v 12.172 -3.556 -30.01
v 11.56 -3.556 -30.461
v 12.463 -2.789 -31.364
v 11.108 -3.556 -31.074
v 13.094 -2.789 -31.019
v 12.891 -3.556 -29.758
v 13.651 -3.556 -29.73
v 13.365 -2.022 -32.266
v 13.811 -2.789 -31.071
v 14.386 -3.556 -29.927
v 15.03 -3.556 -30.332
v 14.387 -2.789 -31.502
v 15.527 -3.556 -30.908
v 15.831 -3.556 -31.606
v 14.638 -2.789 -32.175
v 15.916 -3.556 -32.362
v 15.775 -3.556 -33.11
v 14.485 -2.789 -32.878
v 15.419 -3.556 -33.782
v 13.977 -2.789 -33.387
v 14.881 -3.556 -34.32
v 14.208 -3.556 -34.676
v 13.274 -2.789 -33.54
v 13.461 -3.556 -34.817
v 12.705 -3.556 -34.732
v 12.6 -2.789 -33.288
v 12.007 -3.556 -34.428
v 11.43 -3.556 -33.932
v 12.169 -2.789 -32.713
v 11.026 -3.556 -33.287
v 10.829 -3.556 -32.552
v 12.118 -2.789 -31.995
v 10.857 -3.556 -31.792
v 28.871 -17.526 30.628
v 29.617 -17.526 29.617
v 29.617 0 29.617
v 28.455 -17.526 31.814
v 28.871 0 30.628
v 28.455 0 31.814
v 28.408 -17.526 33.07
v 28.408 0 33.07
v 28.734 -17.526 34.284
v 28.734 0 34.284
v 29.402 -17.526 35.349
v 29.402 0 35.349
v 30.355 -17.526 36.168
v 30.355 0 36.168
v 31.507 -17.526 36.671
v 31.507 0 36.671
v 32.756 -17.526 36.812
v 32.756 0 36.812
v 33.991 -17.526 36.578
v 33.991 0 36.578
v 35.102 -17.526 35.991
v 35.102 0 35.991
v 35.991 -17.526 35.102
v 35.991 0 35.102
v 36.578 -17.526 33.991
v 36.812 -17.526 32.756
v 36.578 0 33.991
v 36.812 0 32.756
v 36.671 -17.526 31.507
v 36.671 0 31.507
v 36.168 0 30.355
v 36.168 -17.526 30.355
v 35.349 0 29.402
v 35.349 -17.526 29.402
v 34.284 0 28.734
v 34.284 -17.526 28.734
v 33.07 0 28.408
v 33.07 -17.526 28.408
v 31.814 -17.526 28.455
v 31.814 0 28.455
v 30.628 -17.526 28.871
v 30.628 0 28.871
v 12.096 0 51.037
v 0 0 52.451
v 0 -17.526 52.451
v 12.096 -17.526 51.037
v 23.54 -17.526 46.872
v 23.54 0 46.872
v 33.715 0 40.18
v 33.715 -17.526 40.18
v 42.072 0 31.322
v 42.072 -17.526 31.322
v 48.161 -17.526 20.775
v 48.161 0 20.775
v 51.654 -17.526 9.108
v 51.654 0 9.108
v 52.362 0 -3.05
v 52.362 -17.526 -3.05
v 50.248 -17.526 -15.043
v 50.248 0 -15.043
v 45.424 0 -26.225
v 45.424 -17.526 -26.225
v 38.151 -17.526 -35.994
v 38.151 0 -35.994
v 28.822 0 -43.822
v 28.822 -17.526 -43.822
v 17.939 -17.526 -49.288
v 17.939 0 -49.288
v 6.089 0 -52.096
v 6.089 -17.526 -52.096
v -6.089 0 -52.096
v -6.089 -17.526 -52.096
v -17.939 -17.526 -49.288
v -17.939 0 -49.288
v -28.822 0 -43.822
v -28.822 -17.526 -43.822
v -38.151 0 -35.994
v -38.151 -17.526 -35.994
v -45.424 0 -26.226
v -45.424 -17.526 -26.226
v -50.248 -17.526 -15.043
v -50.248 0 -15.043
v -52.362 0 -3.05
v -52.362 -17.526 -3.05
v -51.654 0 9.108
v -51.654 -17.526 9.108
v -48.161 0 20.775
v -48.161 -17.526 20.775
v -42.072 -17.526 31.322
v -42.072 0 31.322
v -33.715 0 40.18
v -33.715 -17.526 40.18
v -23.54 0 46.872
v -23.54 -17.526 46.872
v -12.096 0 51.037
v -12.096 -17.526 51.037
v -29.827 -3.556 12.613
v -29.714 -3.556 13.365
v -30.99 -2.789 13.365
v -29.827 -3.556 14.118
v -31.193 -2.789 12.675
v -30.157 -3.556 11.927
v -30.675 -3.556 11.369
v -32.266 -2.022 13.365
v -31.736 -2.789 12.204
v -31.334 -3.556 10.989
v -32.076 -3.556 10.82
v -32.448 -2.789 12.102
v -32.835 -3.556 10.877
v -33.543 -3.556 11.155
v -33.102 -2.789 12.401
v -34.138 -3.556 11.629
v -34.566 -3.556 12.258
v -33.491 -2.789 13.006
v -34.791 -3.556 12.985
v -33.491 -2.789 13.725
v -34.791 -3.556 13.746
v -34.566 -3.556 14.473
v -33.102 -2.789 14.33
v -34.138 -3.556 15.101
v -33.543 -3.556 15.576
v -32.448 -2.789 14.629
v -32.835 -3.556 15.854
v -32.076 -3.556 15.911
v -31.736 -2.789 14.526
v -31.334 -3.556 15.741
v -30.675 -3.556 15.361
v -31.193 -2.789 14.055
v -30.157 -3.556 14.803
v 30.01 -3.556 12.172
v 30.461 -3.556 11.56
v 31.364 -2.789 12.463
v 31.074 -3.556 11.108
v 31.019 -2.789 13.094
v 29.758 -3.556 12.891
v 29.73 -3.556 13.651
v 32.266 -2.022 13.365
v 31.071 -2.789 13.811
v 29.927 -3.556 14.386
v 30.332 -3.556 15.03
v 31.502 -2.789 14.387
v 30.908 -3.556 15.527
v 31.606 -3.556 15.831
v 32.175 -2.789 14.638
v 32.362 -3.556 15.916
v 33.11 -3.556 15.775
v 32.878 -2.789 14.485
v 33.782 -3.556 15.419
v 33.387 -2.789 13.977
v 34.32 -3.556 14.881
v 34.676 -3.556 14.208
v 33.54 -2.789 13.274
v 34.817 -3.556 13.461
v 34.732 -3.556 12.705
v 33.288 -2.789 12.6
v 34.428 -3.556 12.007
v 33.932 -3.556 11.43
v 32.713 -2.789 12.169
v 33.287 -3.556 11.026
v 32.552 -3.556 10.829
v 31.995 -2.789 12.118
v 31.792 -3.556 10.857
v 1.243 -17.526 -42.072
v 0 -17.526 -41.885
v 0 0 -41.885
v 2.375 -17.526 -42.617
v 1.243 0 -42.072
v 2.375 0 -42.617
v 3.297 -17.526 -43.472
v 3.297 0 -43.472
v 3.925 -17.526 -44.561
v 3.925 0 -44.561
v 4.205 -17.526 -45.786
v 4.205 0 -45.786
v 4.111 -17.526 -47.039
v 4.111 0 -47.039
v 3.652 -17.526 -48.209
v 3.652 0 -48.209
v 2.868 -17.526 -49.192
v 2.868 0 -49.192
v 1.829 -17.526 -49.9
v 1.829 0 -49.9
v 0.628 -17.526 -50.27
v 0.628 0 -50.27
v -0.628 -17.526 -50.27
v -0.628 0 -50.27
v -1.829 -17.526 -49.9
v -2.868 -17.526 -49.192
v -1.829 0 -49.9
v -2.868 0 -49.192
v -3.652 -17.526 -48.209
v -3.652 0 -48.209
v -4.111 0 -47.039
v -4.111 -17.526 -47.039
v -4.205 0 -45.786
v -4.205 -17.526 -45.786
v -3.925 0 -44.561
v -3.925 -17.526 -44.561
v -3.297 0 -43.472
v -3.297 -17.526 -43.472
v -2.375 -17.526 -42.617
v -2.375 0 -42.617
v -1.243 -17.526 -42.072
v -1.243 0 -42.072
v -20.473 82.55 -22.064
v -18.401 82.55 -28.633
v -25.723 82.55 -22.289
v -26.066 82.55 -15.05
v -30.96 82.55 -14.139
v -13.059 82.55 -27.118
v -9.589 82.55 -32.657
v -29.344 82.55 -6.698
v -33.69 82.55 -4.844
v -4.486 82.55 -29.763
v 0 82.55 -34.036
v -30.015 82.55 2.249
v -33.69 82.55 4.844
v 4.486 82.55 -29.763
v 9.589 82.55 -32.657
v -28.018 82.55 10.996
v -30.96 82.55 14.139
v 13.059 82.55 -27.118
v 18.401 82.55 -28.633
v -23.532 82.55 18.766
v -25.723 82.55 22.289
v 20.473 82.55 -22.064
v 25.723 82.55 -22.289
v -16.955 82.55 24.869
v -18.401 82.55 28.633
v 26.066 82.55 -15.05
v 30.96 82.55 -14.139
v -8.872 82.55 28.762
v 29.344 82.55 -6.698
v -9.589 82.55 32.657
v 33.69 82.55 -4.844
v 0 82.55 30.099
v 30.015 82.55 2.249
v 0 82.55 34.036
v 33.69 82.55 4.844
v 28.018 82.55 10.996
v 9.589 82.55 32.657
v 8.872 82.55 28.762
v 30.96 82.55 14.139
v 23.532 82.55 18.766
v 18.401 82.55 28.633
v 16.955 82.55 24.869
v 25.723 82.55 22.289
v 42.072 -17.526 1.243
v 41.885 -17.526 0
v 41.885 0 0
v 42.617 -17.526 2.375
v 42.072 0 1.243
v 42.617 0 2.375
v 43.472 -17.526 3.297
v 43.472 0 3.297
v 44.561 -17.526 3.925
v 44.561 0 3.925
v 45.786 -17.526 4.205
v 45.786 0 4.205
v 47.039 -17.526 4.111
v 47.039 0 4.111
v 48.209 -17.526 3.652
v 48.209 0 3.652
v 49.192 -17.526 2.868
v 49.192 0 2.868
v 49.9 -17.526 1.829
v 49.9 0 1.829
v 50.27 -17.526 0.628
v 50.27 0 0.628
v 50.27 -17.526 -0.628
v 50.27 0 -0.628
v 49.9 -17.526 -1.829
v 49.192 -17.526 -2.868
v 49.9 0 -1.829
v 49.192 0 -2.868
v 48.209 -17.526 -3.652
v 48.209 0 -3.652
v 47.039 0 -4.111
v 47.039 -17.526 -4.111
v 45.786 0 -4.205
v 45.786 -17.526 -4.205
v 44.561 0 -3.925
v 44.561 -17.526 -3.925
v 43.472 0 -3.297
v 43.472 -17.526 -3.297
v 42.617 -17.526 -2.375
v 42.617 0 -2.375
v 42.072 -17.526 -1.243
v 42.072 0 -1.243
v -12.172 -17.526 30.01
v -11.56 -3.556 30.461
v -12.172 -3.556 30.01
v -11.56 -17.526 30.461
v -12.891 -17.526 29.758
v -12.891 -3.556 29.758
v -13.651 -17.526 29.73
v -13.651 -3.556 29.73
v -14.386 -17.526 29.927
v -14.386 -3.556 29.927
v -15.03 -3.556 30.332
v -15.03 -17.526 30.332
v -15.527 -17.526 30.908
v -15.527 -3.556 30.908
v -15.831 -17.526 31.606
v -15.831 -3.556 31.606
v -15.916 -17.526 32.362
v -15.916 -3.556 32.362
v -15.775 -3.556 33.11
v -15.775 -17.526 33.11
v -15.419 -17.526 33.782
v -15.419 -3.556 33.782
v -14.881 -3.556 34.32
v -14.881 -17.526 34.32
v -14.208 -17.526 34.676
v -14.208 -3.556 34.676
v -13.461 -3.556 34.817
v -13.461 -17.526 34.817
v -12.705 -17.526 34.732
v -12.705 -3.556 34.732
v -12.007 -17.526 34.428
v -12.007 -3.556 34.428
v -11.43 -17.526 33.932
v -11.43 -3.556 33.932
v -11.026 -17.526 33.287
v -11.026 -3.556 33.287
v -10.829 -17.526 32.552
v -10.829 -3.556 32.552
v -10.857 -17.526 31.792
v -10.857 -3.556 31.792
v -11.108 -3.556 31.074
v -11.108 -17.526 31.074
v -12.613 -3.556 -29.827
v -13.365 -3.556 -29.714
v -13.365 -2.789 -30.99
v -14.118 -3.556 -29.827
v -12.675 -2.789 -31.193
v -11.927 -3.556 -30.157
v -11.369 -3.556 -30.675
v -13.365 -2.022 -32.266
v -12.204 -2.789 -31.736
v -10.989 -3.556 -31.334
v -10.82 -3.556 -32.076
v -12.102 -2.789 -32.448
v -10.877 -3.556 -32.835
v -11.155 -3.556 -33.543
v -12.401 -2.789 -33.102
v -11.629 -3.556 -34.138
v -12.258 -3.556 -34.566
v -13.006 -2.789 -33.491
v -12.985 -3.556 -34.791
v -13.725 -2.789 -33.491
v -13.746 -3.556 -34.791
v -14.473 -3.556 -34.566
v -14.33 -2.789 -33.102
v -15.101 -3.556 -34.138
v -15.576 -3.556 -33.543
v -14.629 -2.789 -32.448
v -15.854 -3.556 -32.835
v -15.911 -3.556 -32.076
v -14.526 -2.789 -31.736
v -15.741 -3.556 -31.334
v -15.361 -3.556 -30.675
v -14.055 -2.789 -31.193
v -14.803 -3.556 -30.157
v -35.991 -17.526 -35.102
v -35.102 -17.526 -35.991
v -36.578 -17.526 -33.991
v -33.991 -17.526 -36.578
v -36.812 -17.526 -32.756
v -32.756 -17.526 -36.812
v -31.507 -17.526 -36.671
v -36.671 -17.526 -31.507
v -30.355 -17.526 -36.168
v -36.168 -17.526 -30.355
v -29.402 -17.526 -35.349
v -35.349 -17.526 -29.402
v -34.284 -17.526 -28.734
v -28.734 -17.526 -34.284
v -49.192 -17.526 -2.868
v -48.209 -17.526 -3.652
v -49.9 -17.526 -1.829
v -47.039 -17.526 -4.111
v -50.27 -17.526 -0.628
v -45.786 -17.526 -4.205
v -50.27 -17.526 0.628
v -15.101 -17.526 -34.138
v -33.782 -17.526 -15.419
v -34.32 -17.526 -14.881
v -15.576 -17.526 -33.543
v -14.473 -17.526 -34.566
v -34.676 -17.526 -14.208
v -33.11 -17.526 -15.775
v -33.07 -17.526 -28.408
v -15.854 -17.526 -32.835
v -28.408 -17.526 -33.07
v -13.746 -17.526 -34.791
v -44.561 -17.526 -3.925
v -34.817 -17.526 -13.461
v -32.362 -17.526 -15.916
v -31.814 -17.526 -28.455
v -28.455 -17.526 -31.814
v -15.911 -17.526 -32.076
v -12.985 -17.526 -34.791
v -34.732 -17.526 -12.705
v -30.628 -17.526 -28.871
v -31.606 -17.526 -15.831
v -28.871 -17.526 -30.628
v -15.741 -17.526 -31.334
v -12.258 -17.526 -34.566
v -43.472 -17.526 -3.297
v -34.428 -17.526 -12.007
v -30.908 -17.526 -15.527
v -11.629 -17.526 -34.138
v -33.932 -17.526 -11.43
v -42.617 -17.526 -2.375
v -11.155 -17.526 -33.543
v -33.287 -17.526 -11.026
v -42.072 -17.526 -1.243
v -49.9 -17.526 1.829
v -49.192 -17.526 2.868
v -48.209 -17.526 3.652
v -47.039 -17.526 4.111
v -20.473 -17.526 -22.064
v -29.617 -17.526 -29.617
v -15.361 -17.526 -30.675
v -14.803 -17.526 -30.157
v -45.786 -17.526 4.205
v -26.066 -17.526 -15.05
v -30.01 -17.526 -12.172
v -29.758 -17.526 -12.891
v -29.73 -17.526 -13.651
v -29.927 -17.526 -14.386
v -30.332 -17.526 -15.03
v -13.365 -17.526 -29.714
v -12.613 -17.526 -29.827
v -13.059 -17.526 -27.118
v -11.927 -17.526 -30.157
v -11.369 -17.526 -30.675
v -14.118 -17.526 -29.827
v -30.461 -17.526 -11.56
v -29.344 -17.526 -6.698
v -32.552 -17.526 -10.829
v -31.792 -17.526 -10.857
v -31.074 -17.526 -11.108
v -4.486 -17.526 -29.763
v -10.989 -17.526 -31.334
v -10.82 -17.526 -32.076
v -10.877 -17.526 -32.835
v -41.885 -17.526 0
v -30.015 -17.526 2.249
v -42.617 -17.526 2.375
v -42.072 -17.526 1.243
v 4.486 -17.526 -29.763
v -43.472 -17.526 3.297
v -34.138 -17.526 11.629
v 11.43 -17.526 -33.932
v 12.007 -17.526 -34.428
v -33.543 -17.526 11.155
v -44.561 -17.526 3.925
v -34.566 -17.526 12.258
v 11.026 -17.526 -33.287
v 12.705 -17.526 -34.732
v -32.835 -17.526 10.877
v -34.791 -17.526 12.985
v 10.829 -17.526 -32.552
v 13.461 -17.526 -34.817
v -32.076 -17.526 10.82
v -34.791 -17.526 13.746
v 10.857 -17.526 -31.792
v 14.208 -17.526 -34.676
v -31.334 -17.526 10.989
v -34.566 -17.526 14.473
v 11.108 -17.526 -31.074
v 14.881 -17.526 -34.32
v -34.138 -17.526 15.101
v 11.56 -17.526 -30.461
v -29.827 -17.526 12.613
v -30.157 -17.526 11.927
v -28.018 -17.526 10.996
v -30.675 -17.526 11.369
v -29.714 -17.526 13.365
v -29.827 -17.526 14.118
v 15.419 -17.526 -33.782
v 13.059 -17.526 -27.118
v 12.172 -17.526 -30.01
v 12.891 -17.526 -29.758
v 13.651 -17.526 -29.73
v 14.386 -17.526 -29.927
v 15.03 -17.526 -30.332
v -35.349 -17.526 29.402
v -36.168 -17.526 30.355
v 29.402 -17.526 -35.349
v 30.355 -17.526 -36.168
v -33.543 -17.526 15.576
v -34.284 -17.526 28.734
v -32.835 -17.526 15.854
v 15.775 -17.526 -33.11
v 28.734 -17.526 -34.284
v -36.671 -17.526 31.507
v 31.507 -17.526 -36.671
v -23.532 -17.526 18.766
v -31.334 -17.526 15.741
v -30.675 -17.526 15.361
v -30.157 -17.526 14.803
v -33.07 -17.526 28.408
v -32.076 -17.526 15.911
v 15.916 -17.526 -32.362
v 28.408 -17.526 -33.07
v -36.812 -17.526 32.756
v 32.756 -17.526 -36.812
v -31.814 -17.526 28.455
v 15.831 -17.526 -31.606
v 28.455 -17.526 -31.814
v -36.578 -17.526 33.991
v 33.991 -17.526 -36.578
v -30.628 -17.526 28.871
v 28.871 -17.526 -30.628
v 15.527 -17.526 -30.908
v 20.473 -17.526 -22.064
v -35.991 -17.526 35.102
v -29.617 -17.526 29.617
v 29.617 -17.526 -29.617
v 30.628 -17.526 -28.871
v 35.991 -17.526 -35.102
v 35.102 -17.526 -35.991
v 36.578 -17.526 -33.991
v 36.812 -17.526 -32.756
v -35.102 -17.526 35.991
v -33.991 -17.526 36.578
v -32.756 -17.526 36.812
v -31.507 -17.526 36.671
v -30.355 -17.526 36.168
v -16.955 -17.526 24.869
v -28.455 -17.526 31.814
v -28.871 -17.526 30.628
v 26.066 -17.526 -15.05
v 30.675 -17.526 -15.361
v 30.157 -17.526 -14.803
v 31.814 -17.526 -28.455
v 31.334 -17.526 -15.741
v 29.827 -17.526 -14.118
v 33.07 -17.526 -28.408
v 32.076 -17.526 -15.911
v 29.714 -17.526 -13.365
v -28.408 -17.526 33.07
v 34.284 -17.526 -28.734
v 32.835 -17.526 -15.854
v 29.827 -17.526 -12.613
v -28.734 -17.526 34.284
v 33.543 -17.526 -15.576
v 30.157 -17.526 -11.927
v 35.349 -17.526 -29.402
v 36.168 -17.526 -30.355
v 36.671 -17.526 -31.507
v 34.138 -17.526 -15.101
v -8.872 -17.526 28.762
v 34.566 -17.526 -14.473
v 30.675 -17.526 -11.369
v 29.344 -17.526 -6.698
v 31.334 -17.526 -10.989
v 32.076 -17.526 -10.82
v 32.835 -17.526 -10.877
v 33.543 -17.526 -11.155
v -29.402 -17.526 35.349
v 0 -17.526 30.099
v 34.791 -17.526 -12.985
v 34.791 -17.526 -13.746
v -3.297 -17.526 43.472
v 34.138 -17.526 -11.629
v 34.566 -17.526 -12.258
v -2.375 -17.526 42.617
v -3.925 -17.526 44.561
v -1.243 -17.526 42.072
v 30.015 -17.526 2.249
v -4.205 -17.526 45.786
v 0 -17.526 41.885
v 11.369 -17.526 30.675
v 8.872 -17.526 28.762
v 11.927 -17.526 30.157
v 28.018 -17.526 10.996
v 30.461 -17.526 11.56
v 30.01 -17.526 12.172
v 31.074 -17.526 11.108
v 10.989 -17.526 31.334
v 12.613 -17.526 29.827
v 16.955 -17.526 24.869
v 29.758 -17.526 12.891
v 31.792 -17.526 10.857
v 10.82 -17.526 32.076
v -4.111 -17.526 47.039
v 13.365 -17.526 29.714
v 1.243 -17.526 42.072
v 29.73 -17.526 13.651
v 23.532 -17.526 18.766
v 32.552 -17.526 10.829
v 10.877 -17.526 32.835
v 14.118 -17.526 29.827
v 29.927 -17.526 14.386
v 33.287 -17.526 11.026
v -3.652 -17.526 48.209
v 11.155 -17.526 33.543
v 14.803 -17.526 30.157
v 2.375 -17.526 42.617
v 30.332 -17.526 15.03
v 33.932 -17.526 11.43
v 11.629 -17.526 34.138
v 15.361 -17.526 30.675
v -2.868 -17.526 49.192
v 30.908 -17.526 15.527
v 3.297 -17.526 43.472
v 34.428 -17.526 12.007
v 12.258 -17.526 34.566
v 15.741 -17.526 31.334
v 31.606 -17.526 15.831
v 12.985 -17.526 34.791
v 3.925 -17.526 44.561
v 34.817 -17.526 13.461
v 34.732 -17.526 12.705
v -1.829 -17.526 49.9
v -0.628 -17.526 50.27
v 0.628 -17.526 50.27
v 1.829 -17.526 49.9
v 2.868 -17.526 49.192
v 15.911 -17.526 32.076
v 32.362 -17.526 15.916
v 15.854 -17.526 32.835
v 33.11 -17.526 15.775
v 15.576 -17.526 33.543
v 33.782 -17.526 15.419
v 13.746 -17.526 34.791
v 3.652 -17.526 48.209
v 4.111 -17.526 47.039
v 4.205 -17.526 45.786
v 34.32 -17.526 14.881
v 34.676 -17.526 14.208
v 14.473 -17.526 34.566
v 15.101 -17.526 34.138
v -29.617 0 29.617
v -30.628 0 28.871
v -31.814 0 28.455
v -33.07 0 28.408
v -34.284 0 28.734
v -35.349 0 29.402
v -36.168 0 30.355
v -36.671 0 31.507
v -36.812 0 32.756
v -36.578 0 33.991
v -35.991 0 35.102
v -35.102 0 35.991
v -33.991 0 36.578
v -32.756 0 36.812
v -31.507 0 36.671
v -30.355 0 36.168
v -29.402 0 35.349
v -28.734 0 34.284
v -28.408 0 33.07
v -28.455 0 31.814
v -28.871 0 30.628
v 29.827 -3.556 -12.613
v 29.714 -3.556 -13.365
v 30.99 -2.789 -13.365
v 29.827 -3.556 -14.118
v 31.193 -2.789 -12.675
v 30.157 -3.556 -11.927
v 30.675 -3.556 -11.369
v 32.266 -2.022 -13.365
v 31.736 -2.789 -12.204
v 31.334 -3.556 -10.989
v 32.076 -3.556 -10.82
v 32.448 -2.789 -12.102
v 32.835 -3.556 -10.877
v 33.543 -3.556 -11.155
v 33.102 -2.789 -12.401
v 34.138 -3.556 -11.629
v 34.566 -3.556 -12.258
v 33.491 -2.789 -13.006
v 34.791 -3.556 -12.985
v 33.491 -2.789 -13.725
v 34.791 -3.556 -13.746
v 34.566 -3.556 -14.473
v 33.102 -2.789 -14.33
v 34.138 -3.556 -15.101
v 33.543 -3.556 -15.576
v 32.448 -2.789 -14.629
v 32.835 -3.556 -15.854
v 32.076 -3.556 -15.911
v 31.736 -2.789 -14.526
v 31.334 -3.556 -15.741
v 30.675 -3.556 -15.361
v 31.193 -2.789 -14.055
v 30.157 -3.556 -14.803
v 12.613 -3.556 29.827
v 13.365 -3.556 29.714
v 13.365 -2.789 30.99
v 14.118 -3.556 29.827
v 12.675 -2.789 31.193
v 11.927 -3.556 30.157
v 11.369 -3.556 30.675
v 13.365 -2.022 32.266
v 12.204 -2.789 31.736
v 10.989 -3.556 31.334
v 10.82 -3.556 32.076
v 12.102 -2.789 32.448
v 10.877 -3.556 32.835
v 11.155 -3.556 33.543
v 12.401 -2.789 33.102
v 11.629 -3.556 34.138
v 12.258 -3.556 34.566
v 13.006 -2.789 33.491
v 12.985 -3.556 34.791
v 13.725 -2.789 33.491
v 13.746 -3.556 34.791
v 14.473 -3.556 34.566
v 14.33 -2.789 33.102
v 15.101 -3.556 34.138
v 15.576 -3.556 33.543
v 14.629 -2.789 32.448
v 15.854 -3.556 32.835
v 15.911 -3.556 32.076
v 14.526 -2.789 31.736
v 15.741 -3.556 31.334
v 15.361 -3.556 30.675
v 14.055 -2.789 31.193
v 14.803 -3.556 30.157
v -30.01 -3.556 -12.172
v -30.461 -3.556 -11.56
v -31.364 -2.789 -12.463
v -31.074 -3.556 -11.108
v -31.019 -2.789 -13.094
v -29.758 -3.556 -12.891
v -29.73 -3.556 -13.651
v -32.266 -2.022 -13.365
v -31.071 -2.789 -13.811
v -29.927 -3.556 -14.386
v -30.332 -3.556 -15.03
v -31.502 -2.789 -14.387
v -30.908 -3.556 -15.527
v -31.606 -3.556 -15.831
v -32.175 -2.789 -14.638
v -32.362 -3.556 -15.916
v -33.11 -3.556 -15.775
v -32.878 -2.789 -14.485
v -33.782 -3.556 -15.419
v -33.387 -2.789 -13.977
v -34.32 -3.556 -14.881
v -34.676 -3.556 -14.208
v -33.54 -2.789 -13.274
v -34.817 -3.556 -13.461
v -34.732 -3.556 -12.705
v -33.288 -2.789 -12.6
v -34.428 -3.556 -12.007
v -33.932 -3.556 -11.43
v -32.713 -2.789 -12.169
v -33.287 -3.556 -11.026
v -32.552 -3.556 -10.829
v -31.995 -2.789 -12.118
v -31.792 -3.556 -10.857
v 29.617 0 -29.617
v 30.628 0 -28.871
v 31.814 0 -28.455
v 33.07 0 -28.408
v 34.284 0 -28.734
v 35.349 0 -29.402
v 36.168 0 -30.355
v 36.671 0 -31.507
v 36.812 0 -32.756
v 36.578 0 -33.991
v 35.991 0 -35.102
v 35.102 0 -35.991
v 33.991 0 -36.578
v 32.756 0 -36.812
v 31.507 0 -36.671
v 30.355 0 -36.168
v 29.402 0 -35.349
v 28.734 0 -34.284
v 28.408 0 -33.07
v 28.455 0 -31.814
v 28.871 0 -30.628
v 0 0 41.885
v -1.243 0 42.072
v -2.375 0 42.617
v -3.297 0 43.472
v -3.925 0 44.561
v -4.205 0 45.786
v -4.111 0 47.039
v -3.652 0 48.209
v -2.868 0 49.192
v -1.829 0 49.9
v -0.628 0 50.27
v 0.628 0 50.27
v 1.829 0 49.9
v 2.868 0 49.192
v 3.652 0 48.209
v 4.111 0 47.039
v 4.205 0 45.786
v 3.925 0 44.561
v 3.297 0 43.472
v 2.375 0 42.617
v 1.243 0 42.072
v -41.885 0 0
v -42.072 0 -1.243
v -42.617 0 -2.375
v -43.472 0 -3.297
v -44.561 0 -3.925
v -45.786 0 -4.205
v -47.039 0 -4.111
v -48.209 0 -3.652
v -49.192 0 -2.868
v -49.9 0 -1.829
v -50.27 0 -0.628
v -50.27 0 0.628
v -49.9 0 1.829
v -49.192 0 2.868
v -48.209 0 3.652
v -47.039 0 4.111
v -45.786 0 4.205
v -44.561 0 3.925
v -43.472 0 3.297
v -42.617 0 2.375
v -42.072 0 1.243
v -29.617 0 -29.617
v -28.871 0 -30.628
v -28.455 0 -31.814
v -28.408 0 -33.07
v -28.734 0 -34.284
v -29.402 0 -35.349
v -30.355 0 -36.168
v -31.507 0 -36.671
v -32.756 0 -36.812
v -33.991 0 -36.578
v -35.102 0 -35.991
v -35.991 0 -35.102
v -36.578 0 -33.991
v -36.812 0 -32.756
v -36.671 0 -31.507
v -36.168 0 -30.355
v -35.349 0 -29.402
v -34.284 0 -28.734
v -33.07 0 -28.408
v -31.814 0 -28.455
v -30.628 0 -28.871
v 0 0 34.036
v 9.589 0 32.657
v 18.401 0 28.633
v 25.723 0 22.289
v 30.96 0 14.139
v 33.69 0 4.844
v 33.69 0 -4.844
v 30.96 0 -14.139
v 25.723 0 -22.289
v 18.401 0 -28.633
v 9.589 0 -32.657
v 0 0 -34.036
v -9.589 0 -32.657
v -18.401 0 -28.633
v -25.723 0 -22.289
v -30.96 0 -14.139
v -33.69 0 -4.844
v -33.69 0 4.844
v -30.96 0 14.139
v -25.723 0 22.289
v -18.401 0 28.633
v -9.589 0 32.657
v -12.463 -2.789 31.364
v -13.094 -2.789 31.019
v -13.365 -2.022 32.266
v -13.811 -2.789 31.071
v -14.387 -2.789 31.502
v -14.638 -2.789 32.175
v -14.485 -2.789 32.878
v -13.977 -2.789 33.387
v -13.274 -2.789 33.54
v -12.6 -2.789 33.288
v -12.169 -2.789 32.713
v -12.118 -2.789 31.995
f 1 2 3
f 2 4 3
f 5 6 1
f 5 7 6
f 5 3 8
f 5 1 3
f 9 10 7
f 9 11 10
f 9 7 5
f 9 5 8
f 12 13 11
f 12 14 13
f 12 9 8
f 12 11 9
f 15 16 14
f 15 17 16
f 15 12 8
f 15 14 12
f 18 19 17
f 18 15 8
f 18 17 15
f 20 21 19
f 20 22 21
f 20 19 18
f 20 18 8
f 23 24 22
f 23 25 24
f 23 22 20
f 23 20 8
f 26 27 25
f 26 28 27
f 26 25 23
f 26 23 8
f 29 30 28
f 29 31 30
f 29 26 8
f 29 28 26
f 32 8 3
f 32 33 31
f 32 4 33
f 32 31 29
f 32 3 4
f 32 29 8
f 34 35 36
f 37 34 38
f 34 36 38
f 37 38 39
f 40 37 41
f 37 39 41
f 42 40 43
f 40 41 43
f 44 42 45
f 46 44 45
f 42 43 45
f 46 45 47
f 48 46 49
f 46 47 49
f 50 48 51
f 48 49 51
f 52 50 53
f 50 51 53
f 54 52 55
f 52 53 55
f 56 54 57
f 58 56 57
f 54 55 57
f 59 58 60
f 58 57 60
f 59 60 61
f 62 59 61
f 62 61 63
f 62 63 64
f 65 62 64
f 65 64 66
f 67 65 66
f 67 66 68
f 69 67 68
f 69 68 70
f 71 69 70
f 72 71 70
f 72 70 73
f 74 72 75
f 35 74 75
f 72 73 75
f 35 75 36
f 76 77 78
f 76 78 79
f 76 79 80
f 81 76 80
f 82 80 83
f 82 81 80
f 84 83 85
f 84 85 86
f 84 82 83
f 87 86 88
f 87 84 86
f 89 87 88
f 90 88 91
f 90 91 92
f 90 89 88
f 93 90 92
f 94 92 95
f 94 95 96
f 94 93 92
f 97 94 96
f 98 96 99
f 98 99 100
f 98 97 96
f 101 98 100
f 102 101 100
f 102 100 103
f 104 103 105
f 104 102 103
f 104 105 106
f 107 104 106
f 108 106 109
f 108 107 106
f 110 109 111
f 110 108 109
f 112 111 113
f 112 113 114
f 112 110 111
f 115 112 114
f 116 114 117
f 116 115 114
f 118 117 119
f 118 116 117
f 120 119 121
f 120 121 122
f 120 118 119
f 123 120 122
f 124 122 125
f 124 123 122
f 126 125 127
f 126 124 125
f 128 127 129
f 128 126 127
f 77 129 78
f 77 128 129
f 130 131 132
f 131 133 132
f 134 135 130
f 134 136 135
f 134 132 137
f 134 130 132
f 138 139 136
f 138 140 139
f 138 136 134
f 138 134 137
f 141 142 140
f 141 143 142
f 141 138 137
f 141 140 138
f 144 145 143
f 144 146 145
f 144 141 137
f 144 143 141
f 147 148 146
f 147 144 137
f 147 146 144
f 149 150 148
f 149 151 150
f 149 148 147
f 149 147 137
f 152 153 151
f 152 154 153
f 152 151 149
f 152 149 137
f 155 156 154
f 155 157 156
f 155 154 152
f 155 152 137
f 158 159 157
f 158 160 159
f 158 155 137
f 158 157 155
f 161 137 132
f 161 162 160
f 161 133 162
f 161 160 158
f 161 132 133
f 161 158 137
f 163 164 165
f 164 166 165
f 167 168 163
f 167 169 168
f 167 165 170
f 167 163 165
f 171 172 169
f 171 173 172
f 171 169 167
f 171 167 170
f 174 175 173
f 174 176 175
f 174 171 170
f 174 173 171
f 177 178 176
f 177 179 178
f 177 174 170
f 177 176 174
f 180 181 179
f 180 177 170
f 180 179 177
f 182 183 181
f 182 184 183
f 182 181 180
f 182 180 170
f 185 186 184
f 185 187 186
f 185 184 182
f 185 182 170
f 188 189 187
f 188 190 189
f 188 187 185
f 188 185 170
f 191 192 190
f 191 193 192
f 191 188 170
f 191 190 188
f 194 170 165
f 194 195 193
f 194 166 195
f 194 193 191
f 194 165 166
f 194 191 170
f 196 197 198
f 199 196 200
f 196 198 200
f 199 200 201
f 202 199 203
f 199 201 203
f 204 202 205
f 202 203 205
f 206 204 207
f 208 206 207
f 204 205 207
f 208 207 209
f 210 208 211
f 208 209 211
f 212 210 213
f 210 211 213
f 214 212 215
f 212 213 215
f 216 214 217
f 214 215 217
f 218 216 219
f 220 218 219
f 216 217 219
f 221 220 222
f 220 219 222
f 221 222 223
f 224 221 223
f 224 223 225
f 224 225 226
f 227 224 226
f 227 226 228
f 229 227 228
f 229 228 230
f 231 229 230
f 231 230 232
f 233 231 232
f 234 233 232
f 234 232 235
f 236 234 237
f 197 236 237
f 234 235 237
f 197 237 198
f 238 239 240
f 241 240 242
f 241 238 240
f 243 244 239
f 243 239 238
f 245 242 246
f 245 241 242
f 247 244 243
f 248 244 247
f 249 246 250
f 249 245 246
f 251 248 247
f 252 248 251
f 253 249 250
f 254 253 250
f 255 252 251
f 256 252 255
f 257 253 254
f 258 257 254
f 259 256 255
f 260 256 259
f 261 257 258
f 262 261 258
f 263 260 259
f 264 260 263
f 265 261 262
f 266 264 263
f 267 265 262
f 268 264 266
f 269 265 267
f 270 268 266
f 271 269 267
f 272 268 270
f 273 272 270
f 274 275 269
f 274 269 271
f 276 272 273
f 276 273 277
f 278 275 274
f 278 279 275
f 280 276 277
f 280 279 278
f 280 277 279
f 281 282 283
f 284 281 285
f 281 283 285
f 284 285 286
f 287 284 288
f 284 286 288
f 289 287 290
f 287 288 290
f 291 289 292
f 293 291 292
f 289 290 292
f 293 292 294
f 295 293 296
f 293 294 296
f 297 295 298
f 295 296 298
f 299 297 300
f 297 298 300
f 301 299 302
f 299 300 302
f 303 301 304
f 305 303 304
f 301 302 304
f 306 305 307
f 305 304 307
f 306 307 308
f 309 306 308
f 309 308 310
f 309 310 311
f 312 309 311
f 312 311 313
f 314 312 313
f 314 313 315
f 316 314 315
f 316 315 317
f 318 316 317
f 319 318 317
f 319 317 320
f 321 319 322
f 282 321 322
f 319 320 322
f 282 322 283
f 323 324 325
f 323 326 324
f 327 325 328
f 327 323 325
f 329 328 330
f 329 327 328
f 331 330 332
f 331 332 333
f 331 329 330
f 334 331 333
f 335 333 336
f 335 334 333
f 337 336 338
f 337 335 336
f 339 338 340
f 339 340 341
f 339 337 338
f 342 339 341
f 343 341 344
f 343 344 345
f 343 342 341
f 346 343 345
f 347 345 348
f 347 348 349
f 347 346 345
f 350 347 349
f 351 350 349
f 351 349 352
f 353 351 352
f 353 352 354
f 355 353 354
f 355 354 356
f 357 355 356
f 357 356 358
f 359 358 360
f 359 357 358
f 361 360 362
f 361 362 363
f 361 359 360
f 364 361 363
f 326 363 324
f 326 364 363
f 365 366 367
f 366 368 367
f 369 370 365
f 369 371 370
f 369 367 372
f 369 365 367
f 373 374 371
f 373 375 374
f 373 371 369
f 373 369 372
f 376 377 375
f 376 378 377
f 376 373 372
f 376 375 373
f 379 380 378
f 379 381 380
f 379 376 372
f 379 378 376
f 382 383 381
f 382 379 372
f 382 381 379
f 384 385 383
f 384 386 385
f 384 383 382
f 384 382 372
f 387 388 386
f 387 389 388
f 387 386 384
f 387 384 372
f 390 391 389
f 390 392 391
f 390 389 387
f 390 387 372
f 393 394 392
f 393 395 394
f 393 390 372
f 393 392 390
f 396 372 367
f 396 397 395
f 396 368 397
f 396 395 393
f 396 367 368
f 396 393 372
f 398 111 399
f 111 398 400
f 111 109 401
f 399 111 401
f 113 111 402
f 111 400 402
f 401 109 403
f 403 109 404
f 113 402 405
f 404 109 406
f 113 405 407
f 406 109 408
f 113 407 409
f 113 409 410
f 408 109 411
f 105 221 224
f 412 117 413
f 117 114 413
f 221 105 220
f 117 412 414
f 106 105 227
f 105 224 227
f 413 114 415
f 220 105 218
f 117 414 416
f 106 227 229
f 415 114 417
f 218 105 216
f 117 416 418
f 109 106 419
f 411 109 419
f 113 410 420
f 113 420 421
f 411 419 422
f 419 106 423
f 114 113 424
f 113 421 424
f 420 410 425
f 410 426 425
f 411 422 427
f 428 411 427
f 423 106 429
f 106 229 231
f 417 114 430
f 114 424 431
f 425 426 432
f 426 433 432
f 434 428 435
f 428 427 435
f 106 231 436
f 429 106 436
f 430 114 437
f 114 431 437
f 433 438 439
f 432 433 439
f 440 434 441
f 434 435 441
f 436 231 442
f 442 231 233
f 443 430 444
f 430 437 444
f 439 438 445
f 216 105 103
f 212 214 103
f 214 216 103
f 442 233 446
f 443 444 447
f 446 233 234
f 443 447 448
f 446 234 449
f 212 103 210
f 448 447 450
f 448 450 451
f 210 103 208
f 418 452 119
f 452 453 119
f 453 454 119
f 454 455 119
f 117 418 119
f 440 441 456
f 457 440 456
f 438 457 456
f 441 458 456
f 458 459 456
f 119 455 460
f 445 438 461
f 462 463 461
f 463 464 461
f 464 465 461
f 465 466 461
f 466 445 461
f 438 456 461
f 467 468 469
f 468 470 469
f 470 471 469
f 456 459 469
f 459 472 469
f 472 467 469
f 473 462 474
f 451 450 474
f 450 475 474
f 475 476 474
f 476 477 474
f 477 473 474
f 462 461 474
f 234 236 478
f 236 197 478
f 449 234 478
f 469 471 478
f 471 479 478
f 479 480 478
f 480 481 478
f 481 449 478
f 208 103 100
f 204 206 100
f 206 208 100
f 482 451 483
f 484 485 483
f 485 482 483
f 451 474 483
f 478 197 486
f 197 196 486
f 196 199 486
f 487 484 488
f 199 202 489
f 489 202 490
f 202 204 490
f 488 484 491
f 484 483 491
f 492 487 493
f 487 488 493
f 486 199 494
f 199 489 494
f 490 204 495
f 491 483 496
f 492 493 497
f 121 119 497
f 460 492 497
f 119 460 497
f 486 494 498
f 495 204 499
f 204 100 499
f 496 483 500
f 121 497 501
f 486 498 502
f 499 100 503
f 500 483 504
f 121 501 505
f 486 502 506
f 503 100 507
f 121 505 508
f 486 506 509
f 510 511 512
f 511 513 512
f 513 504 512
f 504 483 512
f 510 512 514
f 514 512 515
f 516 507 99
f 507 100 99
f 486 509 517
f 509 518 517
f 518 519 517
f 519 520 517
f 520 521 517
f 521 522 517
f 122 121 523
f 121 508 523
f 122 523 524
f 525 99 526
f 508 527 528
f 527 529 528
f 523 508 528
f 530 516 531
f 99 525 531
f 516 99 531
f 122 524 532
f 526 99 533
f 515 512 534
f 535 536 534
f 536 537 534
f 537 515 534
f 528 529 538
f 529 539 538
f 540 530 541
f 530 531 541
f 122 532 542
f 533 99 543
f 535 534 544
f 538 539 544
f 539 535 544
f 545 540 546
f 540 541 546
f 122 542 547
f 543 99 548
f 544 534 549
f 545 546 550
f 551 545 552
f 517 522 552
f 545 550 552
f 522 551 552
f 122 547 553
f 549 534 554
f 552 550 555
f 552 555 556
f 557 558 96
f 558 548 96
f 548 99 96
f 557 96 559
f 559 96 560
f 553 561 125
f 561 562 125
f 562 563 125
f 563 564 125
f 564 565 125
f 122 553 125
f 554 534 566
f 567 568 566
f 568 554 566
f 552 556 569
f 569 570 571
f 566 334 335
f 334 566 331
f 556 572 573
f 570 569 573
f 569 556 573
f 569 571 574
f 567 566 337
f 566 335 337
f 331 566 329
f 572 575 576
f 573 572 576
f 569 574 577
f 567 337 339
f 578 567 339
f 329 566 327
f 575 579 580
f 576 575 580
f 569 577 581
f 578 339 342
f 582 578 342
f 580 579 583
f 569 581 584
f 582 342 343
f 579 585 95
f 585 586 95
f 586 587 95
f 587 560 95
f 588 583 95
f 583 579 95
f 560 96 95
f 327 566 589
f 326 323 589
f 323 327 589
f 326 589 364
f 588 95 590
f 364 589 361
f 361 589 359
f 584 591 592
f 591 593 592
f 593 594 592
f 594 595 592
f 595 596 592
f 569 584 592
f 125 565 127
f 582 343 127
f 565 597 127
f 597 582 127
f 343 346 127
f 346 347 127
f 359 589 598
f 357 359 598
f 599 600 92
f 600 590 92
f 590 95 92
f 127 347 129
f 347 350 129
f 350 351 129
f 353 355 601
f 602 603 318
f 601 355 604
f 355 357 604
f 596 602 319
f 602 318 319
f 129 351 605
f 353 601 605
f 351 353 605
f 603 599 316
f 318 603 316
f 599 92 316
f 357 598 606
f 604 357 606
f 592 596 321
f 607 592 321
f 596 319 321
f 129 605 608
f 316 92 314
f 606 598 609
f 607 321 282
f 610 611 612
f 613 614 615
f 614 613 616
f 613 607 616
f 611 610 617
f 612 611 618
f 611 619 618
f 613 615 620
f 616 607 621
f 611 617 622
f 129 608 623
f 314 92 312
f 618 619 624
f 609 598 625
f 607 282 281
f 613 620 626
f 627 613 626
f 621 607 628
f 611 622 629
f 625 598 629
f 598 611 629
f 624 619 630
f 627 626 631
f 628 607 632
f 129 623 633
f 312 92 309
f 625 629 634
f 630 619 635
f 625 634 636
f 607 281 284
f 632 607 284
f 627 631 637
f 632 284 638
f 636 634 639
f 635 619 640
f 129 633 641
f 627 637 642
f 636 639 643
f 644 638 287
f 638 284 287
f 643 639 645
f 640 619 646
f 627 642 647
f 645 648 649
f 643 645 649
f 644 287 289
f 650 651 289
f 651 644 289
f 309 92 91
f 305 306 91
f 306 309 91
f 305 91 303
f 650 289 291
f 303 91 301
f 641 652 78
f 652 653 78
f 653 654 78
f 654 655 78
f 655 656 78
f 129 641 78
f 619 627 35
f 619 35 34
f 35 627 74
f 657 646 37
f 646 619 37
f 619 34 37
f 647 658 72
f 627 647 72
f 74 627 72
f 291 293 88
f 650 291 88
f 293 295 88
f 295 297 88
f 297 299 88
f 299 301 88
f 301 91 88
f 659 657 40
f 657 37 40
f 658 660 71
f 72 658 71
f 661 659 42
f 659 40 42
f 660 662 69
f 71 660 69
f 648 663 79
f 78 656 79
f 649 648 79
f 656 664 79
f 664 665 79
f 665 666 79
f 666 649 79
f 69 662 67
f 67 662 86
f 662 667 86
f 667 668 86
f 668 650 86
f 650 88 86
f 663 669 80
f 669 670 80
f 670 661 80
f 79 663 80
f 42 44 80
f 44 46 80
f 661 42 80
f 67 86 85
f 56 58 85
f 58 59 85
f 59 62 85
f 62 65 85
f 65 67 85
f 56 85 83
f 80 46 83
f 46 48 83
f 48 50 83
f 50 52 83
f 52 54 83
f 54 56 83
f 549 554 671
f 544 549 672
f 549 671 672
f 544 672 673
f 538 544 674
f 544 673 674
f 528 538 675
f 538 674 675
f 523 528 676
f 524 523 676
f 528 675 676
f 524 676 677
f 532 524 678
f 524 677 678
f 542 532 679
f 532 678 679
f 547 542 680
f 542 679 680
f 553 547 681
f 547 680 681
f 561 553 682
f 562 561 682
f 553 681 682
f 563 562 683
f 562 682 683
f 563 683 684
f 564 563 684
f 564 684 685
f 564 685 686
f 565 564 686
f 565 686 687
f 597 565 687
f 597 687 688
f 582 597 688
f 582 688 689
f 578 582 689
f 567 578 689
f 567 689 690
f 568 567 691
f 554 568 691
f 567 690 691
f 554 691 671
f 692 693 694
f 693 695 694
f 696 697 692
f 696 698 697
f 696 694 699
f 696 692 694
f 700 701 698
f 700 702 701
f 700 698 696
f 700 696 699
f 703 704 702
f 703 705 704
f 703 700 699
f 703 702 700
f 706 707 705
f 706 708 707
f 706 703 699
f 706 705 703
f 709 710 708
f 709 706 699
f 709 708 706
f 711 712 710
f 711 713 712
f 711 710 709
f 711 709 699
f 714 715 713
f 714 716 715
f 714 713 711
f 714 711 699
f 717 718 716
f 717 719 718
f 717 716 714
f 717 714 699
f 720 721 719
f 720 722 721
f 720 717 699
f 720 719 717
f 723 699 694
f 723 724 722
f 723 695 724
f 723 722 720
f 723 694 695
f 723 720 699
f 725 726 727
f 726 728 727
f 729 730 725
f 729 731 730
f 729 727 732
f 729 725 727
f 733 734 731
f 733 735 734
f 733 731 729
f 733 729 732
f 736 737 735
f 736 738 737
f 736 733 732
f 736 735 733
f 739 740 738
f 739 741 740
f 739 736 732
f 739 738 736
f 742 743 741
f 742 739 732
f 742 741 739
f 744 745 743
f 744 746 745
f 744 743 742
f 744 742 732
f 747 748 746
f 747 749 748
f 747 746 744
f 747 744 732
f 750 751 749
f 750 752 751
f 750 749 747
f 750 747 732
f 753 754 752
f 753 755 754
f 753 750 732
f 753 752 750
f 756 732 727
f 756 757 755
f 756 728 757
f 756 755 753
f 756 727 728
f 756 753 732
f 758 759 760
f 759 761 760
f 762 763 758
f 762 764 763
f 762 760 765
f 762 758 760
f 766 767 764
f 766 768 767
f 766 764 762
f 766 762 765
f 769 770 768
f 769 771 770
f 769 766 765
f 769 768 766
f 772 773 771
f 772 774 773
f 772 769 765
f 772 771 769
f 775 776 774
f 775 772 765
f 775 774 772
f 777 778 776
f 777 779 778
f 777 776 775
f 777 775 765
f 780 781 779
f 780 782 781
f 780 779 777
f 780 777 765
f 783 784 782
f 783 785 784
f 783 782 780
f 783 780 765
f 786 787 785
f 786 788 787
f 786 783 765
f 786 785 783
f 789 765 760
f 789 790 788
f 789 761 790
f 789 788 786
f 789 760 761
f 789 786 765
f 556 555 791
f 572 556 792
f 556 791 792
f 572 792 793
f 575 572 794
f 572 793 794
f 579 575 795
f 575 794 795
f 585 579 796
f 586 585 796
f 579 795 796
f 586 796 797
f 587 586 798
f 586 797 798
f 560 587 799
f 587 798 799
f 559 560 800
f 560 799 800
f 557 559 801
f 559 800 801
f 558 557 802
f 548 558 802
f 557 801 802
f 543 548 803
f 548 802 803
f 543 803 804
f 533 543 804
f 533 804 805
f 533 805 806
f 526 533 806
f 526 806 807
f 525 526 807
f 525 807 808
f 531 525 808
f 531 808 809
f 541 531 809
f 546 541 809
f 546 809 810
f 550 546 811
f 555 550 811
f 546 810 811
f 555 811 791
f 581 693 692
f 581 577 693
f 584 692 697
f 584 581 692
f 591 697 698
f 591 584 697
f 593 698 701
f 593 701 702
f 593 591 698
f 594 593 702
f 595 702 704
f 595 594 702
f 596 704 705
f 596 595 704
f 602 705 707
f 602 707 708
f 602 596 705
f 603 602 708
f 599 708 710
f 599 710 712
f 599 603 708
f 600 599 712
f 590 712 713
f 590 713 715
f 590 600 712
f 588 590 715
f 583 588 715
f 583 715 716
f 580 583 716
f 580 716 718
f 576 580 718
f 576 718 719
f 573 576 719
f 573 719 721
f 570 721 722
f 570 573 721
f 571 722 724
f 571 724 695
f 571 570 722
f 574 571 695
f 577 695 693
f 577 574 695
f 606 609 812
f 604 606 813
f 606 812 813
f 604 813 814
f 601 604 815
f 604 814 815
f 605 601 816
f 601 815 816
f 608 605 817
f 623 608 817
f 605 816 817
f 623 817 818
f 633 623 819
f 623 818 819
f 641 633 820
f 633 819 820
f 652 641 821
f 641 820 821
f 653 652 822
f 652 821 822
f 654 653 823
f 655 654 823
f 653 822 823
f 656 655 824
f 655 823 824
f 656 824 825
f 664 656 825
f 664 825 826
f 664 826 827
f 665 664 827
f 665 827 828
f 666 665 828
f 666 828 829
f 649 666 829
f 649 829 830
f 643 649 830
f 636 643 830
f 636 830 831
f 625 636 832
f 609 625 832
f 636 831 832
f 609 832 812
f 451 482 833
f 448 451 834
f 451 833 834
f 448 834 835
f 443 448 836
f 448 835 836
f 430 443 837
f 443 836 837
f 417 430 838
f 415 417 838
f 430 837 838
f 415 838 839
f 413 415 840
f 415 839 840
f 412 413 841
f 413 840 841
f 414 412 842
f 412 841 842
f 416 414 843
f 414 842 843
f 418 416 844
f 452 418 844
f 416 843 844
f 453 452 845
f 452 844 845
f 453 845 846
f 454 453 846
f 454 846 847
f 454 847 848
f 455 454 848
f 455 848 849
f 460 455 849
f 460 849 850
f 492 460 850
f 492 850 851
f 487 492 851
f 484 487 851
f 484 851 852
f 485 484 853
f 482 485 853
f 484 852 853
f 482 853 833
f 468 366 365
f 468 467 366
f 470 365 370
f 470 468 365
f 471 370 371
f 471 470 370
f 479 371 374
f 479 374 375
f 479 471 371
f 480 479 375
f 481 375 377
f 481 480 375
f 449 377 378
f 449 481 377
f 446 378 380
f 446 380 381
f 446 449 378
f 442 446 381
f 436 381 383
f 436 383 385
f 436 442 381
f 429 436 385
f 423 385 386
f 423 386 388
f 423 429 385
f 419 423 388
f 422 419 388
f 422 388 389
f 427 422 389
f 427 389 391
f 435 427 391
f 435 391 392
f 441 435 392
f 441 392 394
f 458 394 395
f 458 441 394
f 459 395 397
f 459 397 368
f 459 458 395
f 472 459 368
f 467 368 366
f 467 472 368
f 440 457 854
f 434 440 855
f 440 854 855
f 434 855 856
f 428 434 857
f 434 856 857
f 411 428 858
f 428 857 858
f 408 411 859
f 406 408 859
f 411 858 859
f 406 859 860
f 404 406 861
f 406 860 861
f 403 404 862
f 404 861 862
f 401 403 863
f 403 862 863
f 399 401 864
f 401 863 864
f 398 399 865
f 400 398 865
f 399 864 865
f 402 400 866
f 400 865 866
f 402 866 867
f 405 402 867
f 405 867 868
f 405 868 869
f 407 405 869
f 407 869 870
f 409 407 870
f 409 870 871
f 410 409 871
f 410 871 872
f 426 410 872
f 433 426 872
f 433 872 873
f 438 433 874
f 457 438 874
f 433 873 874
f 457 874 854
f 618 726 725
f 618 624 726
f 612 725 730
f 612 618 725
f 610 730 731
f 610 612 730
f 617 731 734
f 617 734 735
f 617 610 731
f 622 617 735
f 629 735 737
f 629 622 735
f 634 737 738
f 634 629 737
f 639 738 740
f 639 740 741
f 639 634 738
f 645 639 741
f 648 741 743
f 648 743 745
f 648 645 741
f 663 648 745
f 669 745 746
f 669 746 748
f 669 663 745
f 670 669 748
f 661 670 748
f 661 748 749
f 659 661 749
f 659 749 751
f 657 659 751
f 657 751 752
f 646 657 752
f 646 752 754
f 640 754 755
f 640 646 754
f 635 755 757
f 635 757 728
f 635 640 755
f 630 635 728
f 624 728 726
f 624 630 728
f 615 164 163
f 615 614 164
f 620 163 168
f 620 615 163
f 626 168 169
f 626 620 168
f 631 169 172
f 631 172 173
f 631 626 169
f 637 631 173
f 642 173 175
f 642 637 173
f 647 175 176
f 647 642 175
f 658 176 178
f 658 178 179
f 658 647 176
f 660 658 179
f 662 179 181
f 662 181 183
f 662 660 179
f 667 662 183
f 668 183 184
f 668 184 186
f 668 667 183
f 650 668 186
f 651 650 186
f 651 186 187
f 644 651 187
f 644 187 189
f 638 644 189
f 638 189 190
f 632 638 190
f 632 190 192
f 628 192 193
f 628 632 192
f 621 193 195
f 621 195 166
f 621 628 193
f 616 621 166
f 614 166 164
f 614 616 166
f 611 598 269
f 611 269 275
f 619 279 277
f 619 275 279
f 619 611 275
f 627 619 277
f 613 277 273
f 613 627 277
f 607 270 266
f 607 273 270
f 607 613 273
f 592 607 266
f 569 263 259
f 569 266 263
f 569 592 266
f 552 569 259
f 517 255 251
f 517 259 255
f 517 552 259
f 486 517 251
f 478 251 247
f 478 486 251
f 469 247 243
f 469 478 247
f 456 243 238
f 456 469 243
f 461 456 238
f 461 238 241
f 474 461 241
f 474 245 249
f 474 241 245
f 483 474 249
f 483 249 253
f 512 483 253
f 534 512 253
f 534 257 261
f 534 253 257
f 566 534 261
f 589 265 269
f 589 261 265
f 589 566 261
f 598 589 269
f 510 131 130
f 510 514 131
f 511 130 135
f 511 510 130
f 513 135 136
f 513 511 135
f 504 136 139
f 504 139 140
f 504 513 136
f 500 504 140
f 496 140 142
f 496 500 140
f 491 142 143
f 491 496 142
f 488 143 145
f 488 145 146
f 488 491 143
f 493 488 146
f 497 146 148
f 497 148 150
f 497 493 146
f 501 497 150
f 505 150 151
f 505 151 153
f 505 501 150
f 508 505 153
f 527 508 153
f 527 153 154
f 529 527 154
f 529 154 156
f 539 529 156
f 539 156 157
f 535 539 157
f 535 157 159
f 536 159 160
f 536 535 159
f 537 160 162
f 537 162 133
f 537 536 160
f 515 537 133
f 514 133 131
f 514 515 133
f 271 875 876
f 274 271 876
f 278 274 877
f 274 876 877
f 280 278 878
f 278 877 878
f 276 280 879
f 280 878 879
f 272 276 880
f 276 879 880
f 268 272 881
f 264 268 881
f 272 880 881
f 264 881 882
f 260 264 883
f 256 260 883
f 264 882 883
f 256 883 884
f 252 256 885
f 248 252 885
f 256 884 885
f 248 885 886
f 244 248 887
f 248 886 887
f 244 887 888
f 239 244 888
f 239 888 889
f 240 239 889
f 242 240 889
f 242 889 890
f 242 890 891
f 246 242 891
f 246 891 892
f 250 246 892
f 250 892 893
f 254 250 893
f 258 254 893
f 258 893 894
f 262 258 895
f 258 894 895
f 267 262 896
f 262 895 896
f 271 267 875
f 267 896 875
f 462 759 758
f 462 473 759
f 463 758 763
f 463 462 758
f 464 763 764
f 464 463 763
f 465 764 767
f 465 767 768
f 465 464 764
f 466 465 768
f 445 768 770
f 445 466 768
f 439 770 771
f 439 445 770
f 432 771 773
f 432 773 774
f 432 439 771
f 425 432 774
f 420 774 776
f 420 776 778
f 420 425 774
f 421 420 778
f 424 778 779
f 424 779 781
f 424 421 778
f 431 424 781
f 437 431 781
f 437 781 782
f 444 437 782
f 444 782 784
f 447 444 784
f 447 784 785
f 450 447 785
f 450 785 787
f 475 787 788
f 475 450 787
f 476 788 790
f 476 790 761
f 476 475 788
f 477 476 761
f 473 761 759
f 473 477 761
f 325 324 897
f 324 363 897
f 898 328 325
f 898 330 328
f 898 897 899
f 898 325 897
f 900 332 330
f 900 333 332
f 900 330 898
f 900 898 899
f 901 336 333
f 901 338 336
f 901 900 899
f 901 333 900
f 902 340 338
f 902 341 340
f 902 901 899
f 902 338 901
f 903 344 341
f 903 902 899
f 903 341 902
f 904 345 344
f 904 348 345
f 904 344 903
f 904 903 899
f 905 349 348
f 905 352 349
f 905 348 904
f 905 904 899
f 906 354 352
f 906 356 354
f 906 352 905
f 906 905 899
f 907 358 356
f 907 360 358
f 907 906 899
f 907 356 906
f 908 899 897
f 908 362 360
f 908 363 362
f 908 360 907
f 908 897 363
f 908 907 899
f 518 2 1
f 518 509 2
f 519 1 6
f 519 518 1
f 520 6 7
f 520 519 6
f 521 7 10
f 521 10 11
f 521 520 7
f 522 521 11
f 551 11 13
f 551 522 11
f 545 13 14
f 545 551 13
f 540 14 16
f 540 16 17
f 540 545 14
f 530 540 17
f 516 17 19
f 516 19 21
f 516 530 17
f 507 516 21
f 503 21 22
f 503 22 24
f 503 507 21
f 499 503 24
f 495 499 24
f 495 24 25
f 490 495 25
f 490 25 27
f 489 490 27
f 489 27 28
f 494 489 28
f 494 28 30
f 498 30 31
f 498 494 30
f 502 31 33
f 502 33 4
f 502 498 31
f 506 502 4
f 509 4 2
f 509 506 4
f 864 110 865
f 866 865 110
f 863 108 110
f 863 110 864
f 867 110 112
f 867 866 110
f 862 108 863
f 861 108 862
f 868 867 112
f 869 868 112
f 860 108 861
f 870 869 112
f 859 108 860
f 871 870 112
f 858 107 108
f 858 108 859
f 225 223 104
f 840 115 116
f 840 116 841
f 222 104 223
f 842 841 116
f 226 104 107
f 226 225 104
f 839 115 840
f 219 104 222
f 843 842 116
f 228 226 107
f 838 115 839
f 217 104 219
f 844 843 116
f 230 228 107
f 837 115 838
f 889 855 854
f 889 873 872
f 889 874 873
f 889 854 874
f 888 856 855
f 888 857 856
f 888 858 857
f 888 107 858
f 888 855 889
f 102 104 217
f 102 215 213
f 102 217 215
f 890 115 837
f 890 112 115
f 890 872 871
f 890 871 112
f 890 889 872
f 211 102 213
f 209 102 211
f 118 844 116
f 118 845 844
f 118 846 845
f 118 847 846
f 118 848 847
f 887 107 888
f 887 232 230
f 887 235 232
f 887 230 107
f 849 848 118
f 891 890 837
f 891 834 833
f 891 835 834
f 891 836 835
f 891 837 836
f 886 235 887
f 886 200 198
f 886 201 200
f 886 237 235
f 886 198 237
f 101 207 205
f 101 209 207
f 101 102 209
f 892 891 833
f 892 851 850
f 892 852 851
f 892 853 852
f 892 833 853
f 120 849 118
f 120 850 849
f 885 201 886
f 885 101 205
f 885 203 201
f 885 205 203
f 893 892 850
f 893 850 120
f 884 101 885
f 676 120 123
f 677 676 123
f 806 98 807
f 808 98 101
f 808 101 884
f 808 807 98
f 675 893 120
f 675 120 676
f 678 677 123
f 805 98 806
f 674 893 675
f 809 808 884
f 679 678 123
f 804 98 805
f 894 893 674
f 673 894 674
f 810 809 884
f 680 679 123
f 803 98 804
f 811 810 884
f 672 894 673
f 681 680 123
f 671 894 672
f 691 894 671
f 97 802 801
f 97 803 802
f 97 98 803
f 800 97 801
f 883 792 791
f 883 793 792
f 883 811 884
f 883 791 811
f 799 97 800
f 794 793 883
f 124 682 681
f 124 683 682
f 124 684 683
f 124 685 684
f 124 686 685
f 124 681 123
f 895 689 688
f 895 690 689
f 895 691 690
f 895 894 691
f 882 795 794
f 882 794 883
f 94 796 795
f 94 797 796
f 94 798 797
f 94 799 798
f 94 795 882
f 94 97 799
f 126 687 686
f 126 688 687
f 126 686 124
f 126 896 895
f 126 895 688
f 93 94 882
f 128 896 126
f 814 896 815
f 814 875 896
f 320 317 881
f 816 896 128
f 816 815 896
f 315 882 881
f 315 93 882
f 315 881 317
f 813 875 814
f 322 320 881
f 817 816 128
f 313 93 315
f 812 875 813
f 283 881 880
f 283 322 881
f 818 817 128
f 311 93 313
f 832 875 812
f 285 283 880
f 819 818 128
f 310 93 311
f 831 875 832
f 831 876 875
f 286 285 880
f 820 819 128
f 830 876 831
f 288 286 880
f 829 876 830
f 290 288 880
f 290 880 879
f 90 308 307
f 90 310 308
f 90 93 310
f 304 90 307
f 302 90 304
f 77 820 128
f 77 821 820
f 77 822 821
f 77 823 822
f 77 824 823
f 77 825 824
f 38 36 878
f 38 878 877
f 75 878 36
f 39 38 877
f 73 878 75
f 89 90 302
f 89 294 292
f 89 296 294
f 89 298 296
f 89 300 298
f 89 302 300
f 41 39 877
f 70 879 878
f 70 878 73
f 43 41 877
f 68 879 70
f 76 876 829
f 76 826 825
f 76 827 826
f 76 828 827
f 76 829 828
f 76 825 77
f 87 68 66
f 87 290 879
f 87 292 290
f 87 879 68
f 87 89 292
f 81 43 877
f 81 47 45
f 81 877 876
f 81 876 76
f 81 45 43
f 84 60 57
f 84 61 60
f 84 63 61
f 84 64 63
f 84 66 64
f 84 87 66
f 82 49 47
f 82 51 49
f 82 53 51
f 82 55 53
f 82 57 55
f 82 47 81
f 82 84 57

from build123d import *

# Parameters (mm, degrees)
SKETCH1_R               = 34.036
EXTRUDE1_DEPTH          = 82.55
SKETCH2_R               = 52.451
EXTRUDE2_DEPTH          = 17.526
CUT_EXTRUDE1_DEPTH      = 111.980706891
CUT_EXTRUDE1_DEPTH_BACK = 111.980706891
SKETCH3_R               = 30.099
SKETCH4_R               = 4.2164
CUT_EXTRUDE2_DEPTH      = 17.526
CIRPATTERN1_COUNT       = 8
CIRPATTERN3_COUNT       = 8


with BuildPart() as part:
    # Sketch1 → Extrude1 (new body)
    with BuildSketch(Plane(origin=(0, 0, 0), x_dir=(1, 0, 0), z_dir=(0, 1, 0))):
        Circle(SKETCH1_R)
    extrude(amount=EXTRUDE1_DEPTH)

    # Sketch2 → Extrude2 (add)
    with BuildSketch(Plane(origin=(0, 0, 0), x_dir=(1, 0, 0), z_dir=(0, 1, 0))):
        Circle(SKETCH2_R)
    extrude(amount=-EXTRUDE2_DEPTH)

    # Sketch3 → Cut-Extrude1 (cut, two sides: drawn at the far end of the back side and taken through both)
    with BuildSketch(Plane(origin=(0, 0, 0), x_dir=(1, 0, 0), z_dir=(0, 1, 0)).offset(-CUT_EXTRUDE1_DEPTH_BACK)):
        Circle(SKETCH3_R)
    extrude(amount=CUT_EXTRUDE1_DEPTH + CUT_EXTRUDE1_DEPTH_BACK, mode=Mode.SUBTRACT)

    # Sketch4 → Cut-Extrude2 (cut)
    with BuildSketch(Plane(origin=(0, 0, 0), x_dir=(1, 0, 0), z_dir=(0, 1, 0))):
        with Locations((0, 46.101)):
            Circle(SKETCH4_R)
    cut_extrude2 = extrude(amount=-CUT_EXTRUDE2_DEPTH, mode=Mode.SUBTRACT)

    # CirPattern1: Cut-Extrude2 ×8 about axis
    cirpattern1_axis = Axis((0, 58.676993495, 0), (0, -1, 0))
    for i in range(1, CIRPATTERN1_COUNT):
        add(cut_extrude2.rotate(cirpattern1_axis, i * 360 / CIRPATTERN1_COUNT), mode=Mode.SUBTRACT)

    # Sketch10 → 1/4-20 Tapped Hole2 (revolve, cut)
    with BuildSketch(Plane(origin=(13.365218875, -17.526, 32.266492673), x_dir=(0, 0, -1), z_dir=(1, 0, 0))):
        Polygon((0, 0), (0, 15.503816902), (2.5527, 13.97), (2.5527, 0), align=None)
    f_1_4_20_tapped_hole2 = revolve(axis=Axis((13.365218875, -23.876, 32.266492673), (0, 1, 0)), mode=Mode.SUBTRACT)

    # CirPattern3: 1/4-20 Tapped Hole2 ×8 about axis
    cirpattern3_axis = Axis((0, 58.676993495, 0), (0, -1, 0))
    for i in range(1, CIRPATTERN3_COUNT):
        add(f_1_4_20_tapped_hole2.rotate(cirpattern3_axis, i * 360 / CIRPATTERN3_COUNT), mode=Mode.SUBTRACT)


solid = part.part
